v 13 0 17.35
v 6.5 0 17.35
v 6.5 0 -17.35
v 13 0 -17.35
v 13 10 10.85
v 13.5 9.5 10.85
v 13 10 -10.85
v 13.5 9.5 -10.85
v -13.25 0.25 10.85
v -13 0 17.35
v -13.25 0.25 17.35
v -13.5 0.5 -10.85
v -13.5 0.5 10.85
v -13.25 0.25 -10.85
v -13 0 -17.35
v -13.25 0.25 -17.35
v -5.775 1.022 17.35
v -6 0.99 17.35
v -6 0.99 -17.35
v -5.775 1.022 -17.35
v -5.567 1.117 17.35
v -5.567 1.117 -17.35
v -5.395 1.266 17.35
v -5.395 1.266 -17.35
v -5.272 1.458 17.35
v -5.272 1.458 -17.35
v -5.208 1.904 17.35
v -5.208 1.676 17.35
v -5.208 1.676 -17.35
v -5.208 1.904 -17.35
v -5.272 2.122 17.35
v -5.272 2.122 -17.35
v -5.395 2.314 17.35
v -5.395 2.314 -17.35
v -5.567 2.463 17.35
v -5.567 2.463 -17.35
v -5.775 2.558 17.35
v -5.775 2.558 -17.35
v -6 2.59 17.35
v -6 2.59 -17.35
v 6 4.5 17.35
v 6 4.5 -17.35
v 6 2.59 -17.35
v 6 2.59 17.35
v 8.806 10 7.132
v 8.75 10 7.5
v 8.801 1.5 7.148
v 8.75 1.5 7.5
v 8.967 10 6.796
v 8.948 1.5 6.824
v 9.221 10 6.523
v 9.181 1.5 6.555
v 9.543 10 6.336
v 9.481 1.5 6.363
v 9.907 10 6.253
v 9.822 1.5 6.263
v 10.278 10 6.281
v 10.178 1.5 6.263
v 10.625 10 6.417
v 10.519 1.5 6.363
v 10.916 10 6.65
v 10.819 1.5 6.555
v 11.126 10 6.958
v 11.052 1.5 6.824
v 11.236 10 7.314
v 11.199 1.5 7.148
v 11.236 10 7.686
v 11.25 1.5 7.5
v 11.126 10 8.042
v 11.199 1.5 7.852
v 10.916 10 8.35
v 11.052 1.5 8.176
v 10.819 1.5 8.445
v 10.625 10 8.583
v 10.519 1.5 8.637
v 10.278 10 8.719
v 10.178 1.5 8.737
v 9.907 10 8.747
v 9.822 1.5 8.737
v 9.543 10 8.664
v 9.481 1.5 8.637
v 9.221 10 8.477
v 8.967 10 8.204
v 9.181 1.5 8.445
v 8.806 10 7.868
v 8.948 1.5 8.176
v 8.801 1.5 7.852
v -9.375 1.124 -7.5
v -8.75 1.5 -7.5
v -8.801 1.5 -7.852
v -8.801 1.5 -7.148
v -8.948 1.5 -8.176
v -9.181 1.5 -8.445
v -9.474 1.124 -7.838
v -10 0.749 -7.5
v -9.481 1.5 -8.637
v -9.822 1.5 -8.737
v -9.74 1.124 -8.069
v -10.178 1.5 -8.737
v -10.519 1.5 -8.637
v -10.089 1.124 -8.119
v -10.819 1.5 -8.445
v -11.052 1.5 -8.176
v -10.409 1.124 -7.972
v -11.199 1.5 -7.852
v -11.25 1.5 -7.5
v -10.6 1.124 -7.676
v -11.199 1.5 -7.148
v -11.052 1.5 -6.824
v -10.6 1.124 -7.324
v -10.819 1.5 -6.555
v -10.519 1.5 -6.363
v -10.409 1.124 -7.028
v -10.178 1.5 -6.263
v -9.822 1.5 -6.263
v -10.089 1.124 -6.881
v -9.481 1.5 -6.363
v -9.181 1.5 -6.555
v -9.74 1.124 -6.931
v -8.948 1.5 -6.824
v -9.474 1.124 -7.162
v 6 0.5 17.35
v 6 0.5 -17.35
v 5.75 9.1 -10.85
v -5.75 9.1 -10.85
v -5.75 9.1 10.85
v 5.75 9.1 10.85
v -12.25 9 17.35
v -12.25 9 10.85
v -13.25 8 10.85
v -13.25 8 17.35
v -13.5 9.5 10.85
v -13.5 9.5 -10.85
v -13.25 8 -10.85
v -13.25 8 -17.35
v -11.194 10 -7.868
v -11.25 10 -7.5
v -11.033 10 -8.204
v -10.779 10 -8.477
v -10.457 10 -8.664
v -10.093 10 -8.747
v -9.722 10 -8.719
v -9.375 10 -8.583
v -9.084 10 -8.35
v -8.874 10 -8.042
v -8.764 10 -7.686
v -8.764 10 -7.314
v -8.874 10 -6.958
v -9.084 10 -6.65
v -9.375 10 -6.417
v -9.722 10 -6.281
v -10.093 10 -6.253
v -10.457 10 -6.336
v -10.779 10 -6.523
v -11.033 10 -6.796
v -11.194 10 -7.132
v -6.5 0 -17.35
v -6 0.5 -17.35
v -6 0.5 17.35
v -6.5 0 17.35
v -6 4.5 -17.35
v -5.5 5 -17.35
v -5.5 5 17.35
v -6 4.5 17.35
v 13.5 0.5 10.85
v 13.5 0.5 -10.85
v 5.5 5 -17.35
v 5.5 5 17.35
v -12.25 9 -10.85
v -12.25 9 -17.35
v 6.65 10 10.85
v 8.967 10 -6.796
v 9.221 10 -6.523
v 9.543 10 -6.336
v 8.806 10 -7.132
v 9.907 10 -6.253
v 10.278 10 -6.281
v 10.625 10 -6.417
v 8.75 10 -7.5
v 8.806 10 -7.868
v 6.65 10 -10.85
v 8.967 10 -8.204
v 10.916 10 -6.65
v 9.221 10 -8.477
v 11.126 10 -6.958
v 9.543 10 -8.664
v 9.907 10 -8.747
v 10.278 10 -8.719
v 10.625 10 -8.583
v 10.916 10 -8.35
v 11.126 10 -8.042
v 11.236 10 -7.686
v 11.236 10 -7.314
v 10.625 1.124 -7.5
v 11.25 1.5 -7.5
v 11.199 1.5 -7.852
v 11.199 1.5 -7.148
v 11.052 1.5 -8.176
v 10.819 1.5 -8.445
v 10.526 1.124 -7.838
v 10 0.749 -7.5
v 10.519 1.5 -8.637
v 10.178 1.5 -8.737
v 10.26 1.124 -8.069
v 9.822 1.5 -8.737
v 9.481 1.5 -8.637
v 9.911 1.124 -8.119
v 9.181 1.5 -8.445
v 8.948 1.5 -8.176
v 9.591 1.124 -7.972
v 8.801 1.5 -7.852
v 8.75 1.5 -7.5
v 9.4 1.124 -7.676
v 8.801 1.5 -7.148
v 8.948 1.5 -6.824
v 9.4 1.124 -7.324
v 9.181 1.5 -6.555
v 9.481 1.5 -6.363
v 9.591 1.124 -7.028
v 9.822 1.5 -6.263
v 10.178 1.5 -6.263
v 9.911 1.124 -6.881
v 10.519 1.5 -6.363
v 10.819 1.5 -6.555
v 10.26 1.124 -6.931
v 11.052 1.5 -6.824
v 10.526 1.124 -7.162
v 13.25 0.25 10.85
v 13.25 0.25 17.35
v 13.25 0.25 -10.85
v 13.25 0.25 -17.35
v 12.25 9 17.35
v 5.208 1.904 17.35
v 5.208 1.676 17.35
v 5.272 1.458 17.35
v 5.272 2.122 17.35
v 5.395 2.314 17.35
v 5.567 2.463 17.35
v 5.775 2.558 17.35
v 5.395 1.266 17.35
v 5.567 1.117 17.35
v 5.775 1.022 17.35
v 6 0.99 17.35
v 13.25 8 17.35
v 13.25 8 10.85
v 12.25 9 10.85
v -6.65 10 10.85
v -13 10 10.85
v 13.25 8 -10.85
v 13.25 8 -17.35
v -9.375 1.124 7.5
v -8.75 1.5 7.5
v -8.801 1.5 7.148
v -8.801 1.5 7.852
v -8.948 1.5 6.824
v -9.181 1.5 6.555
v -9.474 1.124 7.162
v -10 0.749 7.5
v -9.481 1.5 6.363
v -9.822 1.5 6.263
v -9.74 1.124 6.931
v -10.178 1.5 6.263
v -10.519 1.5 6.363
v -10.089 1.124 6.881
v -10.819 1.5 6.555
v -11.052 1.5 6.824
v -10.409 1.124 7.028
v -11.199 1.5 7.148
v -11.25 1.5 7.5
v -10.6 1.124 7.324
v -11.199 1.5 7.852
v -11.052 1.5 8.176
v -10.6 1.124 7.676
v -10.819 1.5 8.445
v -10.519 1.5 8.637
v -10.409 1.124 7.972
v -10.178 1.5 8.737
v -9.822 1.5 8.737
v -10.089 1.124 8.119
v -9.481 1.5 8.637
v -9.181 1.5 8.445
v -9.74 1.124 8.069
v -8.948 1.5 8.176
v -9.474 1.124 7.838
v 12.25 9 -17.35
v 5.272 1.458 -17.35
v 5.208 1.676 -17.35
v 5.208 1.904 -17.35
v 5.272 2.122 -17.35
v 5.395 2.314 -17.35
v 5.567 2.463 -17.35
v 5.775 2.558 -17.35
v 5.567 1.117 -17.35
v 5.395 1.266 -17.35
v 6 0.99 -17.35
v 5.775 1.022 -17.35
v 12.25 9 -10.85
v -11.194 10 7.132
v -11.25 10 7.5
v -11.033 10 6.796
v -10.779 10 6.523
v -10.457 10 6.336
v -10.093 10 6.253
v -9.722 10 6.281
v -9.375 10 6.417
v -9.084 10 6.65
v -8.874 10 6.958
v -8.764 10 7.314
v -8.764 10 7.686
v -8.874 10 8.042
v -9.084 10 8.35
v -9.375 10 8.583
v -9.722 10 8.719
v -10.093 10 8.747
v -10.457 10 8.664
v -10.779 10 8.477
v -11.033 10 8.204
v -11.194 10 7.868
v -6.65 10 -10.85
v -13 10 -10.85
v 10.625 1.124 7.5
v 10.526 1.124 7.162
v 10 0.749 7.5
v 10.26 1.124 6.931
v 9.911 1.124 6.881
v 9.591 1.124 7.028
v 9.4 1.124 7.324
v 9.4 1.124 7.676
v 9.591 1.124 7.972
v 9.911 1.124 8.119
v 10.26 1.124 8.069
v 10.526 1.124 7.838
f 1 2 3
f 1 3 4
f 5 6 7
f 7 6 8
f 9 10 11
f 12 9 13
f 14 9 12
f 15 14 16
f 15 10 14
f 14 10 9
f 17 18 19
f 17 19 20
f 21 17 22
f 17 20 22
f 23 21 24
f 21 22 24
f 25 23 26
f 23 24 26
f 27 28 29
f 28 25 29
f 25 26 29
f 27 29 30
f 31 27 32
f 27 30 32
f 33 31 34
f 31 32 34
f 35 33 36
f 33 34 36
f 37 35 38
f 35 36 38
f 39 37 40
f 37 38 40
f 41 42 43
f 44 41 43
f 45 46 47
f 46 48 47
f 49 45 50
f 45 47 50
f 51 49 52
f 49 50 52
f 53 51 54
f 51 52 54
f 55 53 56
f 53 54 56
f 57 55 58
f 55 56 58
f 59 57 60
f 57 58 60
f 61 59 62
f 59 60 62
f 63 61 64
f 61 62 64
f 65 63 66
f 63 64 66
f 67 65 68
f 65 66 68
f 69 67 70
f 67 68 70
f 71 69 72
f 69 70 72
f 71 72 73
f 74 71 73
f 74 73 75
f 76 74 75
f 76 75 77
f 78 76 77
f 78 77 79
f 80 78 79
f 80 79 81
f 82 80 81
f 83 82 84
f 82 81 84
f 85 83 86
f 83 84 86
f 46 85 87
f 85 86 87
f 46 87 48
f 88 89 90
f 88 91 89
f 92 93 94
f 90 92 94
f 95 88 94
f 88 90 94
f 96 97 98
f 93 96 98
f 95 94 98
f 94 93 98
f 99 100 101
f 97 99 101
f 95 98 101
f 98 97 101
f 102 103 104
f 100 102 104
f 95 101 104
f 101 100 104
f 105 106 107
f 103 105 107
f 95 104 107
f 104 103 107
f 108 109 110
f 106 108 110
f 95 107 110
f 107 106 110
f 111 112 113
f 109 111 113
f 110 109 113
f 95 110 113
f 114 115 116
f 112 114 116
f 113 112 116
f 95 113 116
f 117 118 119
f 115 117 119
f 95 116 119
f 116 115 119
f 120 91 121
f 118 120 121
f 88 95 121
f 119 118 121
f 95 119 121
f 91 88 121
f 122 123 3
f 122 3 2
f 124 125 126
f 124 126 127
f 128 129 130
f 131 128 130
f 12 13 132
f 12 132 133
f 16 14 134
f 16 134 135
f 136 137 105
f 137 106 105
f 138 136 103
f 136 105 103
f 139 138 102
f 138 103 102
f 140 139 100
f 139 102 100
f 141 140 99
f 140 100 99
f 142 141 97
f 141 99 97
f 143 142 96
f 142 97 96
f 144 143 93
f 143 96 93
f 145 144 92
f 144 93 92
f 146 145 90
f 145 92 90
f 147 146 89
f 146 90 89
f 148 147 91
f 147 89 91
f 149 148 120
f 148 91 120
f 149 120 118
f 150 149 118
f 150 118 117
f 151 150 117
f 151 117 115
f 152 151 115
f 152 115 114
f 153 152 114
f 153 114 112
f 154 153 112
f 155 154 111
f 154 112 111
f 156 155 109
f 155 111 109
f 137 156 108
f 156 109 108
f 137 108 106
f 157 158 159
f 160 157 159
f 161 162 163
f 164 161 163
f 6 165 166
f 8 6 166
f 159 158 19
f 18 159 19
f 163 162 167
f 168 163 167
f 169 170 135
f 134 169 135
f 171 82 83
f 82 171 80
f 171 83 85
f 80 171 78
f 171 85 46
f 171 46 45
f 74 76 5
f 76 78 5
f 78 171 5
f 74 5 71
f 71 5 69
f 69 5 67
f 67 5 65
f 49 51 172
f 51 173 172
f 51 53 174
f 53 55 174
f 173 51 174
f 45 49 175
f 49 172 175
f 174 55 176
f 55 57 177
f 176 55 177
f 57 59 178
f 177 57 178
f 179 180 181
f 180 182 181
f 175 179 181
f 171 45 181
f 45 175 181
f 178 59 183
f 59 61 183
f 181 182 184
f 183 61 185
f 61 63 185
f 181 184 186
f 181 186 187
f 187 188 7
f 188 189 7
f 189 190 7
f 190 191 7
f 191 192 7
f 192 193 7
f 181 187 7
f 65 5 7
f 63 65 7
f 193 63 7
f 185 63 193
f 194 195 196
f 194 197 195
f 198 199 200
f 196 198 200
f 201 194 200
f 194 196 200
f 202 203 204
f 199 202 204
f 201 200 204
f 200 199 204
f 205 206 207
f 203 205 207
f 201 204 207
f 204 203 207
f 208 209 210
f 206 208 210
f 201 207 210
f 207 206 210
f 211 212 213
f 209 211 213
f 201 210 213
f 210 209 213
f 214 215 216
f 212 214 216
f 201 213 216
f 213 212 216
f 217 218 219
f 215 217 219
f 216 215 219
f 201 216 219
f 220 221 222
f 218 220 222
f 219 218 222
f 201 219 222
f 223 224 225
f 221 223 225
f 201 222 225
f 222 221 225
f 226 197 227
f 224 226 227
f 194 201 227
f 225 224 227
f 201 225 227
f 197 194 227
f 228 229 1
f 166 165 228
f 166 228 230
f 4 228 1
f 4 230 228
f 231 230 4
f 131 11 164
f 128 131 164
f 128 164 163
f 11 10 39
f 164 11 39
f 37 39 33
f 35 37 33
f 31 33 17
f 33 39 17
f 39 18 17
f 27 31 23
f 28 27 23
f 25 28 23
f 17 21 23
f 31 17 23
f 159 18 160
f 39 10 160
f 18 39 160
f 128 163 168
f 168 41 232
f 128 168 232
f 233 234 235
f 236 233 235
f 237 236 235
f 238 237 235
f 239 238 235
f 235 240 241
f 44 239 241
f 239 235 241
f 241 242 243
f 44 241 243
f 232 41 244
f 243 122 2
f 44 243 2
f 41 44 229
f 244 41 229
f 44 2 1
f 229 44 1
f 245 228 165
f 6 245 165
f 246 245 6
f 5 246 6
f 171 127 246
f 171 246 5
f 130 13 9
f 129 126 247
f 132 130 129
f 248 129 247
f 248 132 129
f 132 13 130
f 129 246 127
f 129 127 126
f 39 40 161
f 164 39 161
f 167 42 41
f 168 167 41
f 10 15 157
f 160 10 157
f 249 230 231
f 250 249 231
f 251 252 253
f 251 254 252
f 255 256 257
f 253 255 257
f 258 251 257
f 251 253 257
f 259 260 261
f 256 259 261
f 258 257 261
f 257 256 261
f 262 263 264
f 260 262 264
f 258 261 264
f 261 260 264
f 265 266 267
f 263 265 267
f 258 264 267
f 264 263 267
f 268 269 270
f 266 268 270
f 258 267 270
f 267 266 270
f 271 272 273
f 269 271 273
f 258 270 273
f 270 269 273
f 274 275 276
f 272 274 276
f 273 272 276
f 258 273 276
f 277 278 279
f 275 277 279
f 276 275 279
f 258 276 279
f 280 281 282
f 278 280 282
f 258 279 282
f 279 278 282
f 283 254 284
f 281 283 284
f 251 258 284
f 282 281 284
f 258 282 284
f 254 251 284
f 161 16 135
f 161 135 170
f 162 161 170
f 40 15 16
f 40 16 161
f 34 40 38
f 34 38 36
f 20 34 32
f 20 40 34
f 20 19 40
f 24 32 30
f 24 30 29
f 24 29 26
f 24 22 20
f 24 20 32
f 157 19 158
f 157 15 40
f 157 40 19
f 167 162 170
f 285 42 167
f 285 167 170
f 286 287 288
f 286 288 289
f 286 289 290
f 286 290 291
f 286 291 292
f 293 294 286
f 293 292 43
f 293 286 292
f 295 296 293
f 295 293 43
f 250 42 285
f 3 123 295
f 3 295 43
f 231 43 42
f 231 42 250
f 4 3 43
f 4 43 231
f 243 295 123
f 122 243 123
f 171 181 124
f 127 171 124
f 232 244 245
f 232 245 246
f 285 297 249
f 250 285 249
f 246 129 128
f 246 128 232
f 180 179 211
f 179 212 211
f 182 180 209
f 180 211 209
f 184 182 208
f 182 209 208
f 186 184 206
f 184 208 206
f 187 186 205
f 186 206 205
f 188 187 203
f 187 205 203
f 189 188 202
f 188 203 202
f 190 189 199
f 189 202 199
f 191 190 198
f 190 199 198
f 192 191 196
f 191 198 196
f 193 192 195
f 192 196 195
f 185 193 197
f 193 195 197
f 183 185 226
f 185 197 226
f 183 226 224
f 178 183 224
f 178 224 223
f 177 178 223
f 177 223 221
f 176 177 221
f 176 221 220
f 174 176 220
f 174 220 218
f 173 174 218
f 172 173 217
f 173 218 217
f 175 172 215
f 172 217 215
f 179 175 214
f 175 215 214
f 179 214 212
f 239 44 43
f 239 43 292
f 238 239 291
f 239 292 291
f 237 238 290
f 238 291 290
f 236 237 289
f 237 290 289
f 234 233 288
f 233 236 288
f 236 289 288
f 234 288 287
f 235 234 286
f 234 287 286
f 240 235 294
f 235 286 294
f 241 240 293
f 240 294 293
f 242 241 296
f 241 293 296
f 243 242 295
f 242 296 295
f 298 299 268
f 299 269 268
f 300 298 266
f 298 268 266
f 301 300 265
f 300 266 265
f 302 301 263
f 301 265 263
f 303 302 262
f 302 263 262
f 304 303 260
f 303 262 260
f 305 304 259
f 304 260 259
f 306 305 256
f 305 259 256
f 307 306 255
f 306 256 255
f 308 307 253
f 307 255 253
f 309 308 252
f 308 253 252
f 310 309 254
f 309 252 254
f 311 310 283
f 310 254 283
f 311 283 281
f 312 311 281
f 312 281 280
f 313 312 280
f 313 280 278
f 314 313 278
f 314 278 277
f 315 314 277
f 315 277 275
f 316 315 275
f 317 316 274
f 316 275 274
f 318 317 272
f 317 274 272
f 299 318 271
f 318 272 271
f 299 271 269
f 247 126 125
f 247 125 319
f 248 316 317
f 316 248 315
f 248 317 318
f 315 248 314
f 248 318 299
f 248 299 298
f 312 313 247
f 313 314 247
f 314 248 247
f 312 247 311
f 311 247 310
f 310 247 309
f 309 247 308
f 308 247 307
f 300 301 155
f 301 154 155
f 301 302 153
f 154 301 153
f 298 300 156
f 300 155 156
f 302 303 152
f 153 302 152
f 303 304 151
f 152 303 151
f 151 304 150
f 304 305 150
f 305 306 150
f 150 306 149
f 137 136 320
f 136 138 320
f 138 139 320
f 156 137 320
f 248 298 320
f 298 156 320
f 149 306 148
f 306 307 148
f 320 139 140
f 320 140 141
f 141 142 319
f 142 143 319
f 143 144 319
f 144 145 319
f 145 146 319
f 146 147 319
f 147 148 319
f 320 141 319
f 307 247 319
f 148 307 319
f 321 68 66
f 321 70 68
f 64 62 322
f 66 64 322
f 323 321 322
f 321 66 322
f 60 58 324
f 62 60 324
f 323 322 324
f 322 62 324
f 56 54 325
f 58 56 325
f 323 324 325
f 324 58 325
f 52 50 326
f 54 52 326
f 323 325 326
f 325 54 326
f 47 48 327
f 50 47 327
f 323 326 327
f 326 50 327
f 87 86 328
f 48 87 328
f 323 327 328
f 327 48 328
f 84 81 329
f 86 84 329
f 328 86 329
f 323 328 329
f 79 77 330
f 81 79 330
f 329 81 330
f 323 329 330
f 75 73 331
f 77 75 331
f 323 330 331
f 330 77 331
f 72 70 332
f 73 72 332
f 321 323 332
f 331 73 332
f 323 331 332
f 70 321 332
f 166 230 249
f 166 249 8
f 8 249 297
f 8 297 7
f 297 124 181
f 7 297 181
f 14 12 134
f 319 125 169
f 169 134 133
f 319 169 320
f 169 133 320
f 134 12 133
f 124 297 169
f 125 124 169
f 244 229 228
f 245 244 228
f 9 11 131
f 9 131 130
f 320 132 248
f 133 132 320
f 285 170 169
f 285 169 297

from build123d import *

# Parameters (mm, degrees)
MAINBLOCKSKETCH_W              = 26.5
MAINBLOCKSKETCH_H              = 34.7
MAINBLOCK_DEPTH                = 9
FACEDSURFACESKETCH_W           = 27
FACEDSURFACESKETCH_H           = 21.7
FACEDSURFACE_DEPTH             = 10
M3X0_5_TAPPED_HOLE1_D          = 2.5
M3X0_5_TAPPED_HOLE1_DEPTH      = 8.5
M3X0_5_TAPPED_HOLE1_TIP        = 0.751075774
RAIL_SLOT_DEPTH                = 25.151035175
RAIL_SLOT_DEPTH_BACK           = 25.151035175
INTERNAL_DIP_SKETCH_W          = 13.5
INTERNAL_DIP_SKETCH_H          = 21.7
INTERNAL_DIP_DEPTH             = 0.9
INTERNAL_CHAMFER_SIZE          = 0.5
COSMETIC_CHAMFERS_SIZE         = 1
SMALLER_COSMETIC_CHAMFERS_SIZE = 0.5


with BuildPart() as part:
    # MainBlockSketch → MainBlock (new body)
    with BuildSketch(Plane(origin=(0, 0, 0), x_dir=(1, 0, 0), z_dir=(0, 1, 0))):
        Rectangle(MAINBLOCKSKETCH_W, MAINBLOCKSKETCH_H)
    extrude(amount=MAINBLOCK_DEPTH)

    # FacedSurfaceSketch → FacedSurface (add)
    with BuildSketch(Plane(origin=(0, 0, 0), x_dir=(1, 0, 0), z_dir=(0, 1, 0))):
        Rectangle(FACEDSURFACESKETCH_W, FACEDSURFACESKETCH_H)
    extrude(amount=FACEDSURFACE_DEPTH)

    # M3x0.5 Tapped Hole1
    with Locations(Plane(origin=(0, 10, 0), x_dir=(1, 0, 0), z_dir=(0, 1, 0))):
        with Locations((-10, 7.5), (10, 7.5), (10, -7.5), (-10, -7.5)):
            Hole(M3X0_5_TAPPED_HOLE1_D / 2, depth=M3X0_5_TAPPED_HOLE1_DEPTH)
            with Locations((0, 0, -(M3X0_5_TAPPED_HOLE1_DEPTH + M3X0_5_TAPPED_HOLE1_TIP / 2))):  # 118° drill point
                Cone(0, M3X0_5_TAPPED_HOLE1_D / 2, M3X0_5_TAPPED_HOLE1_TIP, mode=Mode.SUBTRACT)

    # RailSlotSketch → Rail Slot (cut, two sides: drawn at the far end of the back side and taken through both)
    with BuildSketch(Plane.XY.offset(-RAIL_SLOT_DEPTH_BACK)):
        with BuildLine():
            Line((-6, 2.59), (-6, 5))
            Line((-6, 5), (6, 5))
            Line((6, 5), (6, 2.59))
            ThreePointArc((6, 2.59), (5.2, 1.79), (6, 0.99))
            Line((6, 0.99), (6, 0))
            Line((6, 0), (-6, 0))
            Line((-6, 0), (-6, 0.99))
            ThreePointArc((-6, 0.99), (-5.2, 1.79), (-6, 2.59))
        make_face()
    extrude(amount=RAIL_SLOT_DEPTH + RAIL_SLOT_DEPTH_BACK, mode=Mode.SUBTRACT)

    # Internal Dip Sketch → Internal Dip (cut)
    with BuildSketch(Plane(origin=(0, 10, 0), x_dir=(1, 0, 0), z_dir=(0, 1, 0))):
        Rectangle(INTERNAL_DIP_SKETCH_W, INTERNAL_DIP_SKETCH_H)
    extrude(amount=-INTERNAL_DIP_DEPTH, mode=Mode.SUBTRACT)

    # Internal Chamfer
    internal_chamfer_edges = [part.edges().sort_by_distance(p)[0] for p in [
        (6, 5, 0),
        (-6, 5, 0),
    ]]
    chamfer(internal_chamfer_edges, length=INTERNAL_CHAMFER_SIZE)

    # Cosmetic Chamfers
    # the kernel refuses this chamfer: 1 mm, written as the material it adds along each edge
    with BuildSketch(Plane(origin=(-6.75, 9.1, 10.85), x_dir=(0.9996219169112968, -0.027495876610585623, 0), z_dir=(0, 0, -1))) as cosmetic_chamfers_piece_1_section:
        Polygon((COSMETIC_CHAMFERS_SIZE * 0.999621916911, -COSMETIC_CHAMFERS_SIZE * 0.0274958766106), (-COSMETIC_CHAMFERS_SIZE * 0.0274958766106, -COSMETIC_CHAMFERS_SIZE * 0.999621916911), (0, 0), align=None)
    cosmetic_chamfers_piece_1 = extrude(amount=21.7, mode=Mode.PRIVATE)
    cosmetic_chamfers_piece_1 = split(cosmetic_chamfers_piece_1, bisect_by=Plane(origin=(-6.414099253, 10, 0), z_dir=(0, -1, 0)), keep=Keep.TOP, mode=Mode.PRIVATE)
    add(cosmetic_chamfers_piece_1)
    with BuildSketch(Plane(origin=(6.75, 9.1, -10.85), x_dir=(0.02749587661058651, 0.9996219169112968, 0), z_dir=(0, 0, 1))) as cosmetic_chamfers_piece_2_section:
        Polygon((COSMETIC_CHAMFERS_SIZE * 0.999621916911, COSMETIC_CHAMFERS_SIZE * 0.0274958766106), (-COSMETIC_CHAMFERS_SIZE * 0.0274958766106, COSMETIC_CHAMFERS_SIZE * 0.999621916911), (0, 0), align=None)
    cosmetic_chamfers_piece_2 = extrude(amount=21.7, mode=Mode.PRIVATE)
    cosmetic_chamfers_piece_2 = split(cosmetic_chamfers_piece_2, bisect_by=Plane(origin=(6.414099253, 10, 0), z_dir=(0, -1, 0)), keep=Keep.TOP, mode=Mode.PRIVATE)
    add(cosmetic_chamfers_piece_2)
    # the kernel refuses this chamfer: 1 mm, written as the material it takes off along each edge
    with BuildSketch(Plane(origin=(13.25, 9, 19.921682988), x_dir=(0.027495876610585623, -0.9996219169112968, 0), z_dir=(0, 0, -1))) as cosmetic_chamfers_2_piece_1:
        Polygon((COSMETIC_CHAMFERS_SIZE * 0.999621916911, COSMETIC_CHAMFERS_SIZE * 0.0274958766106), (-COSMETIC_CHAMFERS_SIZE * 0.0274958766106, COSMETIC_CHAMFERS_SIZE * 0.999621916911), (0, 0), align=None)
    extrude(amount=9.071682988, mode=Mode.SUBTRACT)
    with BuildSketch(Plane(origin=(-13.25, 9, 10.85), x_dir=(0.9996219169112968, 0.027495876610585647, 0), z_dir=(0, 0, 1)), Plane(origin=(-13.25, 9, -19.921682988), x_dir=(0.9996219169112968, 0.027495876610585647, 0), z_dir=(0, 0, 1)), Plane(origin=(13.25, 9, -10.85), x_dir=(-0.9996219169112968, 0.027495876610585647, 0), z_dir=(0, 0, -1))) as cosmetic_chamfers_2_piece_2:
        Polygon((COSMETIC_CHAMFERS_SIZE * 0.999621916911, -COSMETIC_CHAMFERS_SIZE * 0.0274958766106), (-COSMETIC_CHAMFERS_SIZE * 0.0274958766106, -COSMETIC_CHAMFERS_SIZE * 0.999621916911), (0, 0), align=None)
    extrude(amount=9.071682988, mode=Mode.SUBTRACT)

    # Smaller Cosmetic Chamfers
    smaller_cosmetic_chamfers_edges = [part.edges().sort_by_distance(p)[0] for p in [
        (13.5, 10, 0),
        (-13.5, 10, 0),
        (-13.5, 0, 0),
        (13.5, 0, 0),
        (6, 0, 0),
        (-6, 0, 0),
    ]]
    chamfer(smaller_cosmetic_chamfers_edges, length=SMALLER_COSMETIC_CHAMFERS_SIZE)


solid = part.part
